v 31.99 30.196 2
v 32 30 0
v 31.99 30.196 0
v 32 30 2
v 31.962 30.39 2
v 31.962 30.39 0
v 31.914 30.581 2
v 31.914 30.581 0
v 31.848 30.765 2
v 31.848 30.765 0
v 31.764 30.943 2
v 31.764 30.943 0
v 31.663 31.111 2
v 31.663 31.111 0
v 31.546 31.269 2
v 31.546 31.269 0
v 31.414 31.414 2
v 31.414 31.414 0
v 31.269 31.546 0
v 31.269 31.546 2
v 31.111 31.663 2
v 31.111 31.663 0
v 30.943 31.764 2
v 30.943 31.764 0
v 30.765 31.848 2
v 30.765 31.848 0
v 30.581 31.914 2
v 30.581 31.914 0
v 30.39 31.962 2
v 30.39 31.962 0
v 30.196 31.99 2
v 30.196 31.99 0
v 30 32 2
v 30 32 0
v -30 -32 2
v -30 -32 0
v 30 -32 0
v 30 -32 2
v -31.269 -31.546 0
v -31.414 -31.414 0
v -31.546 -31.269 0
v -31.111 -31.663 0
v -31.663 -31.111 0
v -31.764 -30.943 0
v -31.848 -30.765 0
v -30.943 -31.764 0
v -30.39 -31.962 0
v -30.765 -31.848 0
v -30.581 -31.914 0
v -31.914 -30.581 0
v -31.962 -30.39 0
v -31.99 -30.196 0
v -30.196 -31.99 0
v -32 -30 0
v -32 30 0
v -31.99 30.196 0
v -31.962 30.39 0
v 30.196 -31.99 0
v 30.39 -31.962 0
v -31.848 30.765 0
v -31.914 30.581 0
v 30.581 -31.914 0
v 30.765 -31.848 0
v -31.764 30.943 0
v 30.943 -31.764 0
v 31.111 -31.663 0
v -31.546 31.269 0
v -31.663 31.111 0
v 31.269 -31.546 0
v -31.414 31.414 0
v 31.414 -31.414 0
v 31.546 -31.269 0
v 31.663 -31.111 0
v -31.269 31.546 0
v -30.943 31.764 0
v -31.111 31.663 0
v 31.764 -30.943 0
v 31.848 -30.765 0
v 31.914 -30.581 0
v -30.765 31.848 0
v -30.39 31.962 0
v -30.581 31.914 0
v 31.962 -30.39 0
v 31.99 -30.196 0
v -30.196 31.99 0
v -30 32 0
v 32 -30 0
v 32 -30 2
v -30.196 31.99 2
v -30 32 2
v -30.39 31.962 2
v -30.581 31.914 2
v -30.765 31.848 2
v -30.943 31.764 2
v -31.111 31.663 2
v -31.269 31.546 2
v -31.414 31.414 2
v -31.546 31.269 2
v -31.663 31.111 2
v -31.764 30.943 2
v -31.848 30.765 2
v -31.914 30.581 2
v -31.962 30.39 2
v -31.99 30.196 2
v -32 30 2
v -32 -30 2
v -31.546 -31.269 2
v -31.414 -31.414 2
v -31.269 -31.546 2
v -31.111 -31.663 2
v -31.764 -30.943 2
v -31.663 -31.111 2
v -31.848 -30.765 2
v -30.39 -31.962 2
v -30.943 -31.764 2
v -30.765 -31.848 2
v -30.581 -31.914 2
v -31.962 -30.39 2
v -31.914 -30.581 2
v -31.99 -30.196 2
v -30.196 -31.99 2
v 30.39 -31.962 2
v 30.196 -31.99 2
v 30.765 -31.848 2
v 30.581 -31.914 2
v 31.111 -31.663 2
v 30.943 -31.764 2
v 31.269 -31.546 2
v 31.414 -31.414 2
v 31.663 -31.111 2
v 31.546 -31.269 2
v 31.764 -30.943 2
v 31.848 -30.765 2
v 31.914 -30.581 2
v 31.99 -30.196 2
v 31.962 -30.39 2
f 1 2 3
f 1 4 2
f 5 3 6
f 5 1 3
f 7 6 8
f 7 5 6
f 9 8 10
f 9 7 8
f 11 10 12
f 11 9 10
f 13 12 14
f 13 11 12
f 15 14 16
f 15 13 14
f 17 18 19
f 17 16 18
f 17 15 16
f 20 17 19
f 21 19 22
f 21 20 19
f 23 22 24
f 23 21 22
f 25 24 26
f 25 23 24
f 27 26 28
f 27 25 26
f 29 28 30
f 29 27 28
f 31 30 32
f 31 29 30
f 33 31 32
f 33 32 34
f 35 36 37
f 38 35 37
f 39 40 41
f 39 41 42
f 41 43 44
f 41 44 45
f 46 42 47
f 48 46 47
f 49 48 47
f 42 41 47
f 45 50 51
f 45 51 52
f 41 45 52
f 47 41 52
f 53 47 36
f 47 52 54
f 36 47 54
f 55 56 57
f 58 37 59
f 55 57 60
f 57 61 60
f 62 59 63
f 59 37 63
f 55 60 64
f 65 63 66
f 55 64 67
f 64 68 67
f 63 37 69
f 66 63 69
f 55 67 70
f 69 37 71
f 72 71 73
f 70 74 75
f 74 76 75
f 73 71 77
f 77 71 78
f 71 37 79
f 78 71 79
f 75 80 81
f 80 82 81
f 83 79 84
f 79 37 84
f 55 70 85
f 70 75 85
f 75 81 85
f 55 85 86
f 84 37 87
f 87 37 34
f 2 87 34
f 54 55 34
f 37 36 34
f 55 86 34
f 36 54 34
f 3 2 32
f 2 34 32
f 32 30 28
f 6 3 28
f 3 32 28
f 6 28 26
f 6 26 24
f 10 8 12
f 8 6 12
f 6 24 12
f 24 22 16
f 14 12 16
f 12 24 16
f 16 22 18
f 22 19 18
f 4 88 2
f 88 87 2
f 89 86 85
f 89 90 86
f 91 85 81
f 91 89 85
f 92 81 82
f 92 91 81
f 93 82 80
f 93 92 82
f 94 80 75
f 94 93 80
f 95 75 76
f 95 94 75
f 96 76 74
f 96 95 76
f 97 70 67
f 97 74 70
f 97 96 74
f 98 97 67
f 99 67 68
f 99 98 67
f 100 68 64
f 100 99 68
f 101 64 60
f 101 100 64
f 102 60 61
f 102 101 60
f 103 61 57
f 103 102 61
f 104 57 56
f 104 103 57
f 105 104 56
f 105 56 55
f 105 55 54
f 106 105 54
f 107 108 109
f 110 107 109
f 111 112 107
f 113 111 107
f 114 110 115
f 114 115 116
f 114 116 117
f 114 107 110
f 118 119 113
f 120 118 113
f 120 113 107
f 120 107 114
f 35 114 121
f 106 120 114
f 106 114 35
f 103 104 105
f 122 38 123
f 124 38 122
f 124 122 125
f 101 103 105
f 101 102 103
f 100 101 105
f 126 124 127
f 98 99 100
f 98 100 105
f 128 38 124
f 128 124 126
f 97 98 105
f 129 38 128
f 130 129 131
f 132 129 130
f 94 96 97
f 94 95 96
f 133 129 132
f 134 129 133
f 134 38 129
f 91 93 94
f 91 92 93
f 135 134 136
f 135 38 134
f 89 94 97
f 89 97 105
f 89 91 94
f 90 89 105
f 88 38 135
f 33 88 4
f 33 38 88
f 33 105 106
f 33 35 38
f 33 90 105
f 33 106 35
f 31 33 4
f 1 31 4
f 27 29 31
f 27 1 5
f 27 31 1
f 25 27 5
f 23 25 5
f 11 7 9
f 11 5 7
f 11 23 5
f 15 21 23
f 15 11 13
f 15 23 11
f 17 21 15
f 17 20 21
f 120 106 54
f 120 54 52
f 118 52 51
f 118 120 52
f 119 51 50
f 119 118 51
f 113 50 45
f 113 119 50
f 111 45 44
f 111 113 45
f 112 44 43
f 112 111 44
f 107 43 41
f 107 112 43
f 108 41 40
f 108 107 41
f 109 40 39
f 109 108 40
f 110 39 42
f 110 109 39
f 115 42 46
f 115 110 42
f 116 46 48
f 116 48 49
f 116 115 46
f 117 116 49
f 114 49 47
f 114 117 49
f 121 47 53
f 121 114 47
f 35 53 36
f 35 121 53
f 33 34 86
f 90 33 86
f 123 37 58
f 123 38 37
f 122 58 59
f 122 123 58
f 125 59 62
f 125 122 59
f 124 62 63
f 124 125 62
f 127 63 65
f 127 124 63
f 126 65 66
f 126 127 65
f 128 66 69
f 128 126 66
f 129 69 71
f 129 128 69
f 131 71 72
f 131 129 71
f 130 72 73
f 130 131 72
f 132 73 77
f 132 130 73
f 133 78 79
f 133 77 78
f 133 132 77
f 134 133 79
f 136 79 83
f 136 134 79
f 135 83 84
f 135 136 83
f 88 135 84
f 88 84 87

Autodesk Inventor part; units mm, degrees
ref_plane "YZ Plane" through (0, 0, 0) normal (1, 0, 0) x (0, 1, 0)
ref_plane "XZ Plane" through (0, 0, 0) normal (0, 1, 0) x (-1, 0, 0)
ref_plane "XY Plane" through (0, 0, 0) normal (0, 0, 1) x (1, 0, 0)
sketch "Sketch1" plane through (0, 0, 0) normal (0, 0, 1) x (1, 0, 0)
  line L0 (-32, -32) -> (32, -32)
  line L1 (32, -32) -> (32, 32)
  line L2 (32, 32) -> (-32, 32)
  line L3 (-32, 32) -> (-32, -32)
  line L4 (-32, -32) -> (32, 32) construction
  line L5 (32, -32) -> (-32, 32) construction
  point P0 (0, 0)
  dimension "d154" = 64
  dimension "d155" = 64
extrude "Plate5" add sketch "Sketch1" along normal blind 2
fillet "Corner Round1" radius 2 4 edges at (32, 32, 1) (-32, -32, 1) (-32, 32, 1) (32, -32, 1)
sketch "Sketch11" plane through (-50.5, -22, -28) normal (1, 0, 0) x (0, 0, -1)
  line L0 (-25.25, 44) -> (-25.25, 0) construction
  line L1 (0, 0) -> (-25.25, 0) construction
  line L2 (0, 0) -> (0, 44) construction
  line L3 (0, 44) -> (-25.25, 44) construction
  circle A0 centre (-10, 22) radius 5.5
  point P0 (-28, 22)
  point P1 (0, 22)
  dimension "d192" = 11
  dimension "d193" = 10
cut "Cut3" [suppressed]
feature "Corner Round3" [suppressed]
sketch "Sketch10" plane through (-34, 30, 2) normal (1, 0, 0) x (0, 1, 0)
  line L0 (-60, 0) -> (0, 0)
  line L1 (0, 0) -> (0, -30)
  line L2 (0, -30) -> (-60, -30)
  line L3 (-60, -30) -> (-60, 0)
properties part number "SLM 1424 FDS diam way cup" material "Stainless Steel"
